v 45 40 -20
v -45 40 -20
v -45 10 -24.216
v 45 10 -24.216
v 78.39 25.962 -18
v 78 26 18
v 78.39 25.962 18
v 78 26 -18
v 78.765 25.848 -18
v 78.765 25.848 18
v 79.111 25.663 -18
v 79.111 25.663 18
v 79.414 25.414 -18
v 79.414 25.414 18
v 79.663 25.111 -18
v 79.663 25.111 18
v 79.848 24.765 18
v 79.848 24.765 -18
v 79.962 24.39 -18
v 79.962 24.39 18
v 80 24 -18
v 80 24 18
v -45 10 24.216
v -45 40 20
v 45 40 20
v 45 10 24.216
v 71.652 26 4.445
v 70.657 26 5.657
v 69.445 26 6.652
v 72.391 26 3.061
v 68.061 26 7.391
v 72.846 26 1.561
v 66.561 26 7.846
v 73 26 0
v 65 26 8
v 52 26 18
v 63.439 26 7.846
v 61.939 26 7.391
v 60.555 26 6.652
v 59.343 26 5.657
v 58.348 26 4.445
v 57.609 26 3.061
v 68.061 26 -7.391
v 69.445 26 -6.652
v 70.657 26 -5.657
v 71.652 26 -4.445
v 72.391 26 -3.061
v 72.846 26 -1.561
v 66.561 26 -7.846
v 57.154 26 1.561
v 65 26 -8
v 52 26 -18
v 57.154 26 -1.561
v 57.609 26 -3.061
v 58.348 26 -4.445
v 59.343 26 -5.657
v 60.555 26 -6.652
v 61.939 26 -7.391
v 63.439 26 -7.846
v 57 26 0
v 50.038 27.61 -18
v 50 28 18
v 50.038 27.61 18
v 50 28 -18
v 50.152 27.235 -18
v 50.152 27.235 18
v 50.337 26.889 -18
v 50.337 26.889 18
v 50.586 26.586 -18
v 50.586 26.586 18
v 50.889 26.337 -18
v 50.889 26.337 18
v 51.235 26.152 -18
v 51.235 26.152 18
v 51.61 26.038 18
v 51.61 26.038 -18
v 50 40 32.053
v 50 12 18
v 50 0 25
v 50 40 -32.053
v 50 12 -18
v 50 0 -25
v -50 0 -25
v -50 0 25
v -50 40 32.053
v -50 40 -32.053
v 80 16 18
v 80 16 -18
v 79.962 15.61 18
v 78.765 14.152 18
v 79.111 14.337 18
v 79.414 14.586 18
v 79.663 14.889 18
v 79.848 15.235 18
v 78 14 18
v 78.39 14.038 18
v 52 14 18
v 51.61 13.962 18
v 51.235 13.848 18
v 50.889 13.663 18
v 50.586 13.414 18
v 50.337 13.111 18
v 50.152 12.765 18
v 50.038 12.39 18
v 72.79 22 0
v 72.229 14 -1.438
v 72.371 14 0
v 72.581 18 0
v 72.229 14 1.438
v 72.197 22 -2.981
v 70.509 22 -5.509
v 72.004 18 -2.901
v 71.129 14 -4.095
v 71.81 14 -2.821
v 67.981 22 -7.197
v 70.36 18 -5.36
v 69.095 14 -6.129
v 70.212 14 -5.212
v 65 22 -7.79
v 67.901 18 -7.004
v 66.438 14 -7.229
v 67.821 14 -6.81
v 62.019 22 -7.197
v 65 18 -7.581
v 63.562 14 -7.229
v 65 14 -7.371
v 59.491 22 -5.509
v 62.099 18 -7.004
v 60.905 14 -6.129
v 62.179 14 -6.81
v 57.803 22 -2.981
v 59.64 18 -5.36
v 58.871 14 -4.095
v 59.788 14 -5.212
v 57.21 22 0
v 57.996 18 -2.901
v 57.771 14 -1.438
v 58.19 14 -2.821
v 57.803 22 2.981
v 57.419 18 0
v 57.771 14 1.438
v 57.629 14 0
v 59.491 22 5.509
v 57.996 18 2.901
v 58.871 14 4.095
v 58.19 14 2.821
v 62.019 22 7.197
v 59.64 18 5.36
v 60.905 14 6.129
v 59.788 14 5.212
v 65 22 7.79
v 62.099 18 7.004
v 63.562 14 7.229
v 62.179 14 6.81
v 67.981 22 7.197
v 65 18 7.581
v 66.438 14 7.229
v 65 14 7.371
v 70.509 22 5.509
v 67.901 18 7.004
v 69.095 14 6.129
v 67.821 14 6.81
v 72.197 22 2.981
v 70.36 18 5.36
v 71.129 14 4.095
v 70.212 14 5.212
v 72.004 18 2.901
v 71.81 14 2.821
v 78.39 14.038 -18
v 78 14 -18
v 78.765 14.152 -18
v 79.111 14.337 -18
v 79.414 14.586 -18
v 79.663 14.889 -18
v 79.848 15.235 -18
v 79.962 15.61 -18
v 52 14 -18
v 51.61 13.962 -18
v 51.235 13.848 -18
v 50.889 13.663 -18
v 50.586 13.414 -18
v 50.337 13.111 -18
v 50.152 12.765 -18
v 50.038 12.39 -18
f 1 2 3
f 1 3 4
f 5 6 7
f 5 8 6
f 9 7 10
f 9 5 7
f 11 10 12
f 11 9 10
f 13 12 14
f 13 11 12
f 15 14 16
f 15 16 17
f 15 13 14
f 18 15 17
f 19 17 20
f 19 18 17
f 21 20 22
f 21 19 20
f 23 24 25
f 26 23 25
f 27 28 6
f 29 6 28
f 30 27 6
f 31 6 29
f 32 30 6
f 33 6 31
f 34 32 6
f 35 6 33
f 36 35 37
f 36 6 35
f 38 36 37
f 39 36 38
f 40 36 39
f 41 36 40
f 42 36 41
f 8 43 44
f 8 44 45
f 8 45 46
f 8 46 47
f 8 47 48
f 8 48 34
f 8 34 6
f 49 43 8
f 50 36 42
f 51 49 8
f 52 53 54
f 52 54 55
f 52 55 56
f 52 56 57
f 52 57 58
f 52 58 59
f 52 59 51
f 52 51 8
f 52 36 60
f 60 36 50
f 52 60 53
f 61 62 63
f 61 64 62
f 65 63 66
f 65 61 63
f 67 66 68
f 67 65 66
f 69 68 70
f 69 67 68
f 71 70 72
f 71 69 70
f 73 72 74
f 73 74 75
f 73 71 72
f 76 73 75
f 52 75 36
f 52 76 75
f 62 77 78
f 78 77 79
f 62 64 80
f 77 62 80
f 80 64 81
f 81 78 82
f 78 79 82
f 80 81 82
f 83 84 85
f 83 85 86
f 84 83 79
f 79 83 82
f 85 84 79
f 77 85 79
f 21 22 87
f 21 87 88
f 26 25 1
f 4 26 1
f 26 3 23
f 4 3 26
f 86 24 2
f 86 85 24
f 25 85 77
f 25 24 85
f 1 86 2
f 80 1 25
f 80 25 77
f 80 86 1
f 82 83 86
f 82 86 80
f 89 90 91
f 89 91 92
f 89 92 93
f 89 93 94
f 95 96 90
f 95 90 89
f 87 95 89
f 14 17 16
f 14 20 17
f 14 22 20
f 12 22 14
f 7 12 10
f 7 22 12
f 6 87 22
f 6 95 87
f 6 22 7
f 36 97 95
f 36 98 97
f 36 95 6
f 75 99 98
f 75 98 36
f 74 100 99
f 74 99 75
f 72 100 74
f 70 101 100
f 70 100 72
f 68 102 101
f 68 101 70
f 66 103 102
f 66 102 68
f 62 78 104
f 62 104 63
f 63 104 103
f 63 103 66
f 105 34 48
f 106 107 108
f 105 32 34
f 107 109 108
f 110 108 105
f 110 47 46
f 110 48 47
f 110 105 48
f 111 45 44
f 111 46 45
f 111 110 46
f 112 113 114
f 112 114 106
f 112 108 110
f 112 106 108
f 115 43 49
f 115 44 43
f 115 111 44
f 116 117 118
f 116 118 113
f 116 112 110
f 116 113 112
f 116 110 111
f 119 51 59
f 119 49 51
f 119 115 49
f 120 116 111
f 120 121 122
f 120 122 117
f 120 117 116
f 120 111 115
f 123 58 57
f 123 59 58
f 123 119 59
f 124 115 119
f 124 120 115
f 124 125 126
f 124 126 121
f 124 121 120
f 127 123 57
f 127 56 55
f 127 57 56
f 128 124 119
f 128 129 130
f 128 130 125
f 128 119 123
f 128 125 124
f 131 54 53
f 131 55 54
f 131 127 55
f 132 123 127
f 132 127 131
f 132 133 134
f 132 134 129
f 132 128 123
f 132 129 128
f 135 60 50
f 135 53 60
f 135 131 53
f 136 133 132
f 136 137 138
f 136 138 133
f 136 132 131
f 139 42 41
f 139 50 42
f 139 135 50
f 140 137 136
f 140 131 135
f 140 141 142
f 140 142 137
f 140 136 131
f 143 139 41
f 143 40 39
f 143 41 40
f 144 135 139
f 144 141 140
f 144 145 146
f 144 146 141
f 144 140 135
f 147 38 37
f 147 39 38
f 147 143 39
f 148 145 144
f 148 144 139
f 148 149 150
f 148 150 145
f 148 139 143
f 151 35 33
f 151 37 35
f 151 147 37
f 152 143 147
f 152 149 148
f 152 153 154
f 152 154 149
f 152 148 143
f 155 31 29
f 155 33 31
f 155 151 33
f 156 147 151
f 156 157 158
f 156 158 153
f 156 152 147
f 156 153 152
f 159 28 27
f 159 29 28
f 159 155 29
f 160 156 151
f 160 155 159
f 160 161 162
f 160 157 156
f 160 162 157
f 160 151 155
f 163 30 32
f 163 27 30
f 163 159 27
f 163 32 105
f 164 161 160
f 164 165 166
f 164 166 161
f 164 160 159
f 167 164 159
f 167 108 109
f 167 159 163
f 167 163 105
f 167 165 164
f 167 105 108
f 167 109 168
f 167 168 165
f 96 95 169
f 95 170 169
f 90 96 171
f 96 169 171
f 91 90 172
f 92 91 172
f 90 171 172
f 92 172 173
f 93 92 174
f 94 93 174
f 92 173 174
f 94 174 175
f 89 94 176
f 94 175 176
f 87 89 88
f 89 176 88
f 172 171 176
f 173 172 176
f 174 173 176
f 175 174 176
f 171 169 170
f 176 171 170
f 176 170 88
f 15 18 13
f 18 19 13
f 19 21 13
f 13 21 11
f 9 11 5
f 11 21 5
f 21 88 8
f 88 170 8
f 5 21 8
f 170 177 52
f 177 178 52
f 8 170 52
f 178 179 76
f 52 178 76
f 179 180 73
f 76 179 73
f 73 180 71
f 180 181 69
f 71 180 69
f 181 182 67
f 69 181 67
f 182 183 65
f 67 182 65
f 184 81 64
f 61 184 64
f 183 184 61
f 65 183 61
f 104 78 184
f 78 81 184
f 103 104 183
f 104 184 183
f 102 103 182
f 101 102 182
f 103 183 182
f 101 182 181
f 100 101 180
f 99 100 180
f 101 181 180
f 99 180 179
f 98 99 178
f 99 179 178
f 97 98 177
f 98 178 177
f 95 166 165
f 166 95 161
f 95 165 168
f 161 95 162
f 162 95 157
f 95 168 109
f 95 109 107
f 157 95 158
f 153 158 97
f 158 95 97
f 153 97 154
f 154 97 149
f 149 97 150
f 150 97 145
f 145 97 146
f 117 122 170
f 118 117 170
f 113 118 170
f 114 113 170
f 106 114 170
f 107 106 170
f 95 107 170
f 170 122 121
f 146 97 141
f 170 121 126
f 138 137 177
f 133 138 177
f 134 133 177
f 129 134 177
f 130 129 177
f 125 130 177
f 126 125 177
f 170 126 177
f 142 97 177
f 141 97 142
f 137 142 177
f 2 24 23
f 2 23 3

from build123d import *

# Parameters (mm, degrees)
SKETCH1_W           = 100
SKETCH1_H           = 50
BOSS_EXTRUDE1_DEPTH = 40
SKETCH2_W           = 90
SKETCH2_H           = 40
CUT_EXTRUDE1_DEPTH  = 30
SKETCH3_W           = 36
SKETCH3_H           = 12
BOSS_EXTRUDE2_DEPTH = 30
FILLET1_R           = 2
DRAFT2_ANGLE        = 10
DRAFT5_ANGLE        = -8
SKETCH4_R           = 8
CUT_EXTRUDE2_DEPTH  = 27
CUT_EXTRUDE2_TAPER  = 3


with BuildPart() as part:
    # Sketch1 → Boss-Extrude1 (new body)
    with BuildSketch(Plane(origin=(0, 0, 0), x_dir=(1, 0, 0), z_dir=(0, 1, 0))):
        Rectangle(SKETCH1_W, SKETCH1_H)
    extrude(amount=BOSS_EXTRUDE1_DEPTH)

    # Sketch2 → Cut-Extrude1 (cut)
    with BuildSketch(Plane(origin=(0, 40, 0), x_dir=(1, 0, 0), z_dir=(0, 1, 0))):
        Rectangle(SKETCH2_W, SKETCH2_H)
    extrude(amount=-CUT_EXTRUDE1_DEPTH, mode=Mode.SUBTRACT)

    # Sketch3 → Boss-Extrude2 (add)
    with BuildSketch(Plane(origin=(50, 0, 0), x_dir=(0, 0, -1), z_dir=(1, 0, 0))):
        with Locations((0, 20)):
            Rectangle(SKETCH3_W, SKETCH3_H)
    extrude(amount=BOSS_EXTRUDE2_DEPTH)

    # Fillet1
    fillet1_edges = [part.edges().sort_by_distance(p)[0] for p in [
        (50, 26, 0),
        (50, 14, 0),
        (80, 26, 0),
        (80, 14, 0),
    ]]
    fillet(fillet1_edges, radius=FILLET1_R)

    # Draft2
    draft2_faces = [part.faces().sort_by_distance(p)[0] for p in [
        (0, 20, -25),
        (0, 20, 25),
    ]]
    draft(draft2_faces, Plane(origin=(0, 0, 0), x_dir=(0, 0, -1), z_dir=(0, -1, 0)), DRAFT2_ANGLE)

    # Draft5
    draft5_faces = [part.faces().sort_by_distance(p)[0] for p in [
        (0, 25, 20),
        (0, 25, -20),
    ]]
    draft(draft5_faces, Plane.ZX.offset(40), DRAFT5_ANGLE)

    # Sketch4 → Cut-Extrude2 (cut, through all)
    with BuildSketch(Plane(origin=(0, 26, 0), x_dir=(1, 0, 0), z_dir=(0, 1, 0))):
        with Locations((65, 0)):
            Circle(SKETCH4_R)
    extrude(amount=-CUT_EXTRUDE2_DEPTH, taper=CUT_EXTRUDE2_TAPER, mode=Mode.SUBTRACT)


solid = part.part
